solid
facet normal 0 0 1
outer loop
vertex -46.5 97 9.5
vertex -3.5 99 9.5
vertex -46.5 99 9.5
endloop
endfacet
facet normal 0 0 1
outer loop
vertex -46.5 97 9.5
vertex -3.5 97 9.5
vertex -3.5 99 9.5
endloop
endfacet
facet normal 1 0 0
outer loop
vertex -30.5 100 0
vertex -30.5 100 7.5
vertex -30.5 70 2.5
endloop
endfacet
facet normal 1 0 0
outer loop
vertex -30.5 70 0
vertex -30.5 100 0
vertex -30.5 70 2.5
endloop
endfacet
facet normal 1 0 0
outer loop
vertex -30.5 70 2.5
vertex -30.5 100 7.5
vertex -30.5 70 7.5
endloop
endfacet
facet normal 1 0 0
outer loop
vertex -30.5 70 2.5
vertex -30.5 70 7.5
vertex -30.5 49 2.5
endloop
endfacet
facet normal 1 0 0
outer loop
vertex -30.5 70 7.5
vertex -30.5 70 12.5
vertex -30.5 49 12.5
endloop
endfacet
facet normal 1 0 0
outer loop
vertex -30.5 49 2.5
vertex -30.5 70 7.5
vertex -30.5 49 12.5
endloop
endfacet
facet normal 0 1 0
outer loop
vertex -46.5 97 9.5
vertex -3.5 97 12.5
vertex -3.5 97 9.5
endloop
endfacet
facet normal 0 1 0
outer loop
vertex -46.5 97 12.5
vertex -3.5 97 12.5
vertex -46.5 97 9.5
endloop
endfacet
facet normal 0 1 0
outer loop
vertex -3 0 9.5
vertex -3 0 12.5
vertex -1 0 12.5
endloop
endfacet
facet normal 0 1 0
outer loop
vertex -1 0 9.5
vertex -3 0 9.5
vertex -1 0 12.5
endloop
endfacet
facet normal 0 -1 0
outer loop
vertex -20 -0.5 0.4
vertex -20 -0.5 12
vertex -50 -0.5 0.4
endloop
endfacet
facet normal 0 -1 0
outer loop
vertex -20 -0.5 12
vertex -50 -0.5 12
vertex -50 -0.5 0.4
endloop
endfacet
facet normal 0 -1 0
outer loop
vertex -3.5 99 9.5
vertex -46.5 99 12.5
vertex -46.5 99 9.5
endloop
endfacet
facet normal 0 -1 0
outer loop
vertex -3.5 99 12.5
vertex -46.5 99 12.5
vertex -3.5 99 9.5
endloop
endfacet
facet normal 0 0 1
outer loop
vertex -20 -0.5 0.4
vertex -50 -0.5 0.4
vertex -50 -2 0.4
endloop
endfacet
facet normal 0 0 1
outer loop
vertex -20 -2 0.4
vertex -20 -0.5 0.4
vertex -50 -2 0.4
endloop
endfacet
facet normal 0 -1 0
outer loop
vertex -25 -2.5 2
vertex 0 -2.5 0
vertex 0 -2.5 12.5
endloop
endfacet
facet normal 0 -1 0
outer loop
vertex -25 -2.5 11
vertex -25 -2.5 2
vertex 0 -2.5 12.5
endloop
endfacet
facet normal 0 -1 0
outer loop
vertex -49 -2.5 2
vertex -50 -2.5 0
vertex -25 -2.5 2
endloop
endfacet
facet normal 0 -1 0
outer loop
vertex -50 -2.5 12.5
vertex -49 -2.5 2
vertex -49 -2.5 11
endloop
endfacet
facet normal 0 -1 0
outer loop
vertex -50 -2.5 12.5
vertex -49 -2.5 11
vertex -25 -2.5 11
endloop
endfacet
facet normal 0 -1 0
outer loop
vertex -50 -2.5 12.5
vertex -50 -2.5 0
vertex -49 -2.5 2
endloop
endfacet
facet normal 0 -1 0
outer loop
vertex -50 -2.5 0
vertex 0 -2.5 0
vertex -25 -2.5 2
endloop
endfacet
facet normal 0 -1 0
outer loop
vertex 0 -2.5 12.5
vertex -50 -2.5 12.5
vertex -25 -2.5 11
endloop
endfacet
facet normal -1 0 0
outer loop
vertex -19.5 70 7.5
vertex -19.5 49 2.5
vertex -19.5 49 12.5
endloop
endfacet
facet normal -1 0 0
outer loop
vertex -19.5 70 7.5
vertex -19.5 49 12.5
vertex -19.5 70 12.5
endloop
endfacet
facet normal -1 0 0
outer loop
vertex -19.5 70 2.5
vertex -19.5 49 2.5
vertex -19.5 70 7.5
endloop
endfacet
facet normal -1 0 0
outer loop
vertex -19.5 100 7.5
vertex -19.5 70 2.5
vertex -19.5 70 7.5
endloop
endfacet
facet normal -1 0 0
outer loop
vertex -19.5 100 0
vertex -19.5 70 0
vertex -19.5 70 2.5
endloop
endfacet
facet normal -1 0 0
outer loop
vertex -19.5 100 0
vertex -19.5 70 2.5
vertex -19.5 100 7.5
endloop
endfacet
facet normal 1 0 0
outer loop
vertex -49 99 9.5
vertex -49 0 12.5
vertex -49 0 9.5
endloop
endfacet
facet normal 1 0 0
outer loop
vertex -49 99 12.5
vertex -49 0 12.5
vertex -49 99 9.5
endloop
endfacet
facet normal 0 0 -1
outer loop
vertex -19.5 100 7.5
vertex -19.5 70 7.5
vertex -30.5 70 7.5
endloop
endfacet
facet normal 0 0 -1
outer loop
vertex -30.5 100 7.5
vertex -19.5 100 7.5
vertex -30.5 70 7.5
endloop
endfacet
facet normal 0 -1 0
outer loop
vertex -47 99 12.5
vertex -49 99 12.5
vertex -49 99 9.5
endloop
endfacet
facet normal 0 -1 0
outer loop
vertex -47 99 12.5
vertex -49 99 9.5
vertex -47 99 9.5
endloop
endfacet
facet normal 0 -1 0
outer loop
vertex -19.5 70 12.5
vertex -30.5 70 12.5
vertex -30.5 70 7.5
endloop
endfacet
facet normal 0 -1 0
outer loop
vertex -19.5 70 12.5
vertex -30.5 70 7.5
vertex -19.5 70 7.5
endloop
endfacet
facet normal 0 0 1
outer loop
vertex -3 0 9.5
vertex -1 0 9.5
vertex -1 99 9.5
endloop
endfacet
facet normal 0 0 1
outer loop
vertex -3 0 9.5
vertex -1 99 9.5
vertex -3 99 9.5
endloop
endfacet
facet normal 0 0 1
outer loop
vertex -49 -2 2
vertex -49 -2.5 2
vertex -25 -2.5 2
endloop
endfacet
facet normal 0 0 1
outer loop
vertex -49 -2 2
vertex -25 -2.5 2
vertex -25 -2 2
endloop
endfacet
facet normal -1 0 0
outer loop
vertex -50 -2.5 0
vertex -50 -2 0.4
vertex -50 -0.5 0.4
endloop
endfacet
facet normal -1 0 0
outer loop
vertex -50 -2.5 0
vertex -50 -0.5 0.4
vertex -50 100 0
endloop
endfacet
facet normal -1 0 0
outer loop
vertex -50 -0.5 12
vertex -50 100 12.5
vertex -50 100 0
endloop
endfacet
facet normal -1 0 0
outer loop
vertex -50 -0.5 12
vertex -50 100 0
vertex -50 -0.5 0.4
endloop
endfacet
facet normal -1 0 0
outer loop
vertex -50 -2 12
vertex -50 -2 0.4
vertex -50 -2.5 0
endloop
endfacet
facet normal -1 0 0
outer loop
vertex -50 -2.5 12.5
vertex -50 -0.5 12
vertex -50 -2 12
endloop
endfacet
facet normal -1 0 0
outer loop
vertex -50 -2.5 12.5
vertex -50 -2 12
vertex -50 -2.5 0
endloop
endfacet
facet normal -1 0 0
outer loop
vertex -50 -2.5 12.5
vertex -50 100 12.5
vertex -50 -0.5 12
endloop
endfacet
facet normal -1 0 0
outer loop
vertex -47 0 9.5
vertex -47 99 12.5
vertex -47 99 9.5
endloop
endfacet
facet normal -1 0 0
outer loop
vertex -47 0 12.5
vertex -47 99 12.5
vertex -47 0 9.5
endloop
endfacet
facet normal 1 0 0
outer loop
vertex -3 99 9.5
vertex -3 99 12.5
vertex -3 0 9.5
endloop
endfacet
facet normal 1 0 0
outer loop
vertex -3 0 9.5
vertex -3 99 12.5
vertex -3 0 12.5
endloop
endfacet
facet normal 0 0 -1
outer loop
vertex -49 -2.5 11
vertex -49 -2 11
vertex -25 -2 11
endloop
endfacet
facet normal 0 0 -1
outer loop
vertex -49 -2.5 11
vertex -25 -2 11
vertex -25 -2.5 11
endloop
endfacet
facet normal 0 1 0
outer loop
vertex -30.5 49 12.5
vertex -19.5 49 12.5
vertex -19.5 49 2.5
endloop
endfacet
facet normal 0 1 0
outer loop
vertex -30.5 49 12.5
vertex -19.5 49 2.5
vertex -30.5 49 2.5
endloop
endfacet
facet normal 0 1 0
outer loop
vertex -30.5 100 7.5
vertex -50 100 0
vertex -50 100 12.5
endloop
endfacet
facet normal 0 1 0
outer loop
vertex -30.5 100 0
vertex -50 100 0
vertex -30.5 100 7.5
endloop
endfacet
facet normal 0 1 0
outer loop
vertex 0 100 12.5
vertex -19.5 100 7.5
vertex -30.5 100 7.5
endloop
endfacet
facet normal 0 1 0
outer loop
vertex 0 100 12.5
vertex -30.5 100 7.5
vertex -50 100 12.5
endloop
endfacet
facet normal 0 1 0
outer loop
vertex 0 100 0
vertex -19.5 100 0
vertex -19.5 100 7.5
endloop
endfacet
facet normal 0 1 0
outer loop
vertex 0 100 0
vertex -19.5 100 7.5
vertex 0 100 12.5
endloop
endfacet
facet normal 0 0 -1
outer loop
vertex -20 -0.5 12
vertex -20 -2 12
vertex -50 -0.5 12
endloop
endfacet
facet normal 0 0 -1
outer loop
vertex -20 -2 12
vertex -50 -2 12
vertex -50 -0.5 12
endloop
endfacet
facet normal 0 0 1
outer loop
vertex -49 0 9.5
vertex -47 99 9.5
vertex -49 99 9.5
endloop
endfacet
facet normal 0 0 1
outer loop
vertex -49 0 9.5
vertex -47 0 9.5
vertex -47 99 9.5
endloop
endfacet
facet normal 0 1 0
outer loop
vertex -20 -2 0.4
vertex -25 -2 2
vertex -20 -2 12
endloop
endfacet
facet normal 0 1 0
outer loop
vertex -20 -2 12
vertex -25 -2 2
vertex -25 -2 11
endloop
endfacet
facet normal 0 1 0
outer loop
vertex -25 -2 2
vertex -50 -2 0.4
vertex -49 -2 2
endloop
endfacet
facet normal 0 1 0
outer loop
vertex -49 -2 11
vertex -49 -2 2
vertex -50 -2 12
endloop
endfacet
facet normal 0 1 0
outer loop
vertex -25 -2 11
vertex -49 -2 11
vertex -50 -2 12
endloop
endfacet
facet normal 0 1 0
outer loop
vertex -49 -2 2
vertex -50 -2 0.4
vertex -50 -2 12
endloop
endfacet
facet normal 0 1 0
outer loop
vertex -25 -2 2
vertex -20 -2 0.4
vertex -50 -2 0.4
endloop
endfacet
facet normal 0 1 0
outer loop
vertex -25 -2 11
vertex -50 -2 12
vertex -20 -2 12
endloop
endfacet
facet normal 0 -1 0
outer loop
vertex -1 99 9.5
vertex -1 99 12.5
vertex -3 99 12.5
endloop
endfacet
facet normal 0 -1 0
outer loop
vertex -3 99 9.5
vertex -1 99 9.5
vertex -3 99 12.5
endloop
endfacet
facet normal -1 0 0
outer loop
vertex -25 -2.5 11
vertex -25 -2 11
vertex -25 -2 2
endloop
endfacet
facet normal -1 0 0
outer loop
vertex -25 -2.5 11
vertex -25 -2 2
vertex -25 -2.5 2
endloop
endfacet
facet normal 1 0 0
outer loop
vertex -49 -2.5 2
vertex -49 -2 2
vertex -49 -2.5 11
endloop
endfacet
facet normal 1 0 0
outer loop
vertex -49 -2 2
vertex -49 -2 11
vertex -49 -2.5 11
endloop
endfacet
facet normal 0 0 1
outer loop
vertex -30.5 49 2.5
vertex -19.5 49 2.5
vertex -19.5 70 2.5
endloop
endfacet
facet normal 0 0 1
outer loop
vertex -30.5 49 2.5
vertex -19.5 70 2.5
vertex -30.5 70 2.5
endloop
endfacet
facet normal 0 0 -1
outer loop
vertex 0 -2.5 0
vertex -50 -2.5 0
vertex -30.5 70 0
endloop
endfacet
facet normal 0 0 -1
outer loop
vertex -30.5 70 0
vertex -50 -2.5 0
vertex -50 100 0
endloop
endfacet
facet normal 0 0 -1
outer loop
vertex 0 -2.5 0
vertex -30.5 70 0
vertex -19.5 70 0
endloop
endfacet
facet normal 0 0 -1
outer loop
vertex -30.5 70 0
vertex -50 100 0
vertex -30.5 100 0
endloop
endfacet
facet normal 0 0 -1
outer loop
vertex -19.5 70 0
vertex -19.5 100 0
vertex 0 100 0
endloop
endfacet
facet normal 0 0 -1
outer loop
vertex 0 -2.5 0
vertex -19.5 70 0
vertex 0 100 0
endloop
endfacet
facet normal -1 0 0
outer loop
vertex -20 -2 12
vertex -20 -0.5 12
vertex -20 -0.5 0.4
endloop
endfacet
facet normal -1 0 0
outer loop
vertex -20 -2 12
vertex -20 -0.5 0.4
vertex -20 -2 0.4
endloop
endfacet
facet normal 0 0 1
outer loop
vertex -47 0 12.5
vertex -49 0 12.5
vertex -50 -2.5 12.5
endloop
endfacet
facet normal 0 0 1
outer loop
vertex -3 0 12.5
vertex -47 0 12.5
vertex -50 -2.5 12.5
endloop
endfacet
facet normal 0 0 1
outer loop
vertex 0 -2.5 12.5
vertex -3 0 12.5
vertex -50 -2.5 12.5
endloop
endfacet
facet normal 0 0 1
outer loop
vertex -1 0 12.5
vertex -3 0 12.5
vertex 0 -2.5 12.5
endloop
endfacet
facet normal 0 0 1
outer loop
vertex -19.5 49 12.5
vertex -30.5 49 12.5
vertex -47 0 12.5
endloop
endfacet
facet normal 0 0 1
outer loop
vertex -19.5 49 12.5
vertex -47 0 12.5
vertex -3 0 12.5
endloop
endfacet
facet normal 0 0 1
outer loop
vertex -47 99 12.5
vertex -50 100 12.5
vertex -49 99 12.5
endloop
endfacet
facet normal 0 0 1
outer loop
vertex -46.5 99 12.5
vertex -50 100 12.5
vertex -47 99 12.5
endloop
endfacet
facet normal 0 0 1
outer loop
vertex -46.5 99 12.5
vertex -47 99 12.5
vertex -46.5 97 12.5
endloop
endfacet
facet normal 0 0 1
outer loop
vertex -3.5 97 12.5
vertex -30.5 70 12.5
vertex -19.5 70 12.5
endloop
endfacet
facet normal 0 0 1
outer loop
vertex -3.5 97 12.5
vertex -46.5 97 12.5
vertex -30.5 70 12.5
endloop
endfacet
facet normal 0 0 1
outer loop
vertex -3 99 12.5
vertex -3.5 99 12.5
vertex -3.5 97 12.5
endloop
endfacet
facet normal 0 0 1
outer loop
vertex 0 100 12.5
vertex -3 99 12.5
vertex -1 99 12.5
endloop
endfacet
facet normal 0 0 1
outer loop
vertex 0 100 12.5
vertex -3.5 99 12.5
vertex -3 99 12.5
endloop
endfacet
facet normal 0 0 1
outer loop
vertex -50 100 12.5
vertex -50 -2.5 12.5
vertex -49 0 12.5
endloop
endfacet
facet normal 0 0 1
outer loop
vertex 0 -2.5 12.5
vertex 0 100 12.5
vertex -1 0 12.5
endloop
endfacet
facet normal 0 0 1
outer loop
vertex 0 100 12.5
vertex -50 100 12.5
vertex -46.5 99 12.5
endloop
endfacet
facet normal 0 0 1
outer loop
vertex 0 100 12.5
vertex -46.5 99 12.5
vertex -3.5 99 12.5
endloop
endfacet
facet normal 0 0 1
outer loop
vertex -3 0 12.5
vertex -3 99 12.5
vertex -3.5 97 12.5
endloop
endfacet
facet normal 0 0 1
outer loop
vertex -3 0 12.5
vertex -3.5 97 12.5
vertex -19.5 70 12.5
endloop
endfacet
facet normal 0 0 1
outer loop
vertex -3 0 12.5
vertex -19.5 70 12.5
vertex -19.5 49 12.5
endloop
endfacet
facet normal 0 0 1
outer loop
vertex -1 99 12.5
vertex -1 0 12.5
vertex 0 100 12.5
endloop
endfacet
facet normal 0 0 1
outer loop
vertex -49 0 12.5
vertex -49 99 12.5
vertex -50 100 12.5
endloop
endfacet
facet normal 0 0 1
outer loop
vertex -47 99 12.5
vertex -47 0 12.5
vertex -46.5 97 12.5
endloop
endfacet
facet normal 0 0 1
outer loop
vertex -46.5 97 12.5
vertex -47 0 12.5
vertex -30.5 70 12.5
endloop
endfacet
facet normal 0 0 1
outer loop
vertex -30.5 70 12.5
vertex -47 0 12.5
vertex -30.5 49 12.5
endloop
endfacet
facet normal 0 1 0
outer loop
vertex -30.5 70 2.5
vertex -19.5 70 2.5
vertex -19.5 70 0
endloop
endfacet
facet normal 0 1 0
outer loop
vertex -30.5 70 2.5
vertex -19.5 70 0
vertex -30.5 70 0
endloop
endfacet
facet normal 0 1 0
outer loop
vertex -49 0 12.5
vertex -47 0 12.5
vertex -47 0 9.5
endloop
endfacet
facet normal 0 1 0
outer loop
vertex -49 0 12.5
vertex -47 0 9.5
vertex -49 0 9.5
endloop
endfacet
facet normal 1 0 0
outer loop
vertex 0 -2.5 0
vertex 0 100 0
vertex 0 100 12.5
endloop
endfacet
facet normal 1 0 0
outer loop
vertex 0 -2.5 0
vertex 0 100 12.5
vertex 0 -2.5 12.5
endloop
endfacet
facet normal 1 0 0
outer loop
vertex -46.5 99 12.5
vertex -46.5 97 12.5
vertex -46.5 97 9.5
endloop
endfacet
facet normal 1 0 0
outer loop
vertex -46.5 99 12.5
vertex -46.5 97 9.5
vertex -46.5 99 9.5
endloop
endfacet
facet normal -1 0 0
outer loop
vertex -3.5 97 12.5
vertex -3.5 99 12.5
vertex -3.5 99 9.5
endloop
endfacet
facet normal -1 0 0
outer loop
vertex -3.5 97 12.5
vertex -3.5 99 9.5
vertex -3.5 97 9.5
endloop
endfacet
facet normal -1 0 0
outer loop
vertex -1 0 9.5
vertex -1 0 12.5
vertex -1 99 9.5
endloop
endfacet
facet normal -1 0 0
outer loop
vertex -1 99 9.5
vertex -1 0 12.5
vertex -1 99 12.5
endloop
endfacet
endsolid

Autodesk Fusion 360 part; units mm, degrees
sketch "Sketch1" plane through (0, 0, 0) normal (0, 0, 1) x (1, 0, 0)
  line L0 (-50, 100) -> (0, 100)
  line L1 (0, 100) -> (0, -2.5)
  line L2 (0, -2.5) -> (-50, -2.5)
  line L3 (-50, -2.5) -> (-50, 100)
  dimension "d1" = 50
  dimension "d2" = 102.5
extrude "Extrude1" add sketch "Sketch1" along normal blind 12.5
sketch "Sketch2" plane through (0, 0, 12.5) normal (0, 0, 1) x (-1, 0, 0)
  line L0 (50, 2.5) -> (0, 2.5)
  line L1 (0, 2.5) -> (0, -100)
  line L2 (0, -100) -> (50, -100)
  line L3 (50, -100) -> (50, 2.5)
  line L4 (50, -100) -> (49, -100)
  line L5 (49, -100) -> (49, -99)
  line L6 (49, -99) -> (47, -99)
  line L7 (47, -99) -> (47, 0)
  line L8 (47, 0) -> (49, 0)
  line L9 (49, 0) -> (49, -99)
  line L10 (50, -100) -> (0, -100)
  line L11 (3, -99) -> (3, 0)
  line L12 (1, 0) -> (1, -99)
  line L13 (1, -99) -> (3, -99)
  line L14 (3, 0) -> (1, 0)
  line L15 (47, -99) -> (46.5, -99)
  line L16 (46.5, -99) -> (3.5, -99)
  line L17 (3.5, -99) -> (3.5, -97)
  line L18 (3.5, -97) -> (46.5, -97)
  line L19 (46.5, -97) -> (46.5, -99)
  dimension "d5" = 2
  dimension "d6" = 99
  dimension "d7" = 43
  dimension "d8" = 2
extrude "Extrude2" cut sketch "Sketch2" against normal blind 3 contours L16 L17 L18 L19 | L6 L7 L8 L9 | L11 L12 L13 L14
sketch "Sketch3" plane through (0, 0, 12.5) normal (0, 0, 1) x (-1, 0, 0)
  line L0 (47, -99) -> (47, 0)
  line L1 (47, 0) -> (49, 0)
  line L2 (49, 0) -> (49, -99)
  line L3 (49, -99) -> (47, -99)
  line L4 (1, -99) -> (1, 0)
  line L5 (1, 0) -> (3, 0)
  line L6 (3, 0) -> (3, -99)
  line L7 (3, -99) -> (1, -99)
  line L8 (3.5, -99) -> (3.5, -97)
  line L9 (3.5, -97) -> (46.5, -97)
  line L10 (46.5, -97) -> (46.5, -99)
  line L11 (46.5, -99) -> (3.5, -99)
  line L12 (50, 2.5) -> (0, 2.5)
  line L13 (0, 2.5) -> (0, -100)
  line L14 (0, -100) -> (50, -100)
  line L15 (50, -100) -> (50, 2.5)
  line L16 (50, -100) -> (50, -70)
  line L17 (50, -70) -> (30.5, -70)
  line L18 (30.5, -70) -> (19.5, -70)
  line L19 (19.5, -70) -> (19.5, -49)
  line L20 (19.5, -49) -> (30.5, -49)
  line L21 (30.5, -49) -> (30.5, -70)
  dimension "d11" = 30
  dimension "d12" = 19.5
  dimension "d13" = 11
  dimension "d14" = 21
extrude "Extrude3" cut sketch "Sketch3" against normal blind 10 contours L18 L19 L20 L21
sketch "Sketch4" plane through (0, 0, 2.5) normal (0, 0, 1) x (-1, 0, 0)
  line L0 (30.5, -49) -> (19.5, -49)
  line L1 (19.5, -49) -> (19.5, -70)
  line L2 (19.5, -70) -> (30.5, -70)
  line L3 (30.5, -70) -> (30.5, -49)
  line L4 (30.5, -67.3616) -> (19.5, -67.3616)
  line L5 (19.5, -67.3616) -> (19.5, -100.8789)
  line L6 (19.5, -100.8789) -> (30.5, -100.8789)
  line L7 (30.5, -100.8789) -> (30.5, -67.3616)
extrude "Extrude4" cut sketch "Sketch4" against normal blind 30 contours L2 L5 L6 L7
extrude "Extrude5" cut 1 faces at (-26.8333, 90, 2.5) along direction (0, 0, 1) blind 5
sketch "Sketch5" plane through (-50, 0, 0) normal (-1, 0, 0) x (0, -1, 0)
  line L0 (-100, 0) -> (2.5, 0)
  line L1 (2.5, 0) -> (2.5, 12.5)
  line L2 (2.5, 12.5) -> (-100, 12.5)
  line L3 (-100, 12.5) -> (-100, 0)
  line L4 (2.5, 0) -> (2.5, 2)
  line L5 (2.5, 2) -> (2, 2)
  line L6 (2, 2) -> (2, 11)
  line L7 (2, 11) -> (2.5, 11)
  line L8 (2, 11) -> (2, 12)
  line L9 (2, 12) -> (0.5, 12)
  line L10 (0.5, 12) -> (0.5, 0.4)
  line L11 (0.5, 0.4) -> (2, 0.4)
  line L12 (2, 0.4) -> (2, 2)
  dimension "d21" = 1.5
  dimension "d22" = 11.6
extrude "Extrude6" cut sketch "Sketch5" against normal blind 30 contours L6 L8 L9 L10 L11 L12
extrude "Extrude7" cut sketch "Sketch5" against normal blind 25 contours L1 L5 L6 L7
extrude "Extrude8" add sketch "Sketch5" against normal blind 1 contours L1 L5 L6 L7
